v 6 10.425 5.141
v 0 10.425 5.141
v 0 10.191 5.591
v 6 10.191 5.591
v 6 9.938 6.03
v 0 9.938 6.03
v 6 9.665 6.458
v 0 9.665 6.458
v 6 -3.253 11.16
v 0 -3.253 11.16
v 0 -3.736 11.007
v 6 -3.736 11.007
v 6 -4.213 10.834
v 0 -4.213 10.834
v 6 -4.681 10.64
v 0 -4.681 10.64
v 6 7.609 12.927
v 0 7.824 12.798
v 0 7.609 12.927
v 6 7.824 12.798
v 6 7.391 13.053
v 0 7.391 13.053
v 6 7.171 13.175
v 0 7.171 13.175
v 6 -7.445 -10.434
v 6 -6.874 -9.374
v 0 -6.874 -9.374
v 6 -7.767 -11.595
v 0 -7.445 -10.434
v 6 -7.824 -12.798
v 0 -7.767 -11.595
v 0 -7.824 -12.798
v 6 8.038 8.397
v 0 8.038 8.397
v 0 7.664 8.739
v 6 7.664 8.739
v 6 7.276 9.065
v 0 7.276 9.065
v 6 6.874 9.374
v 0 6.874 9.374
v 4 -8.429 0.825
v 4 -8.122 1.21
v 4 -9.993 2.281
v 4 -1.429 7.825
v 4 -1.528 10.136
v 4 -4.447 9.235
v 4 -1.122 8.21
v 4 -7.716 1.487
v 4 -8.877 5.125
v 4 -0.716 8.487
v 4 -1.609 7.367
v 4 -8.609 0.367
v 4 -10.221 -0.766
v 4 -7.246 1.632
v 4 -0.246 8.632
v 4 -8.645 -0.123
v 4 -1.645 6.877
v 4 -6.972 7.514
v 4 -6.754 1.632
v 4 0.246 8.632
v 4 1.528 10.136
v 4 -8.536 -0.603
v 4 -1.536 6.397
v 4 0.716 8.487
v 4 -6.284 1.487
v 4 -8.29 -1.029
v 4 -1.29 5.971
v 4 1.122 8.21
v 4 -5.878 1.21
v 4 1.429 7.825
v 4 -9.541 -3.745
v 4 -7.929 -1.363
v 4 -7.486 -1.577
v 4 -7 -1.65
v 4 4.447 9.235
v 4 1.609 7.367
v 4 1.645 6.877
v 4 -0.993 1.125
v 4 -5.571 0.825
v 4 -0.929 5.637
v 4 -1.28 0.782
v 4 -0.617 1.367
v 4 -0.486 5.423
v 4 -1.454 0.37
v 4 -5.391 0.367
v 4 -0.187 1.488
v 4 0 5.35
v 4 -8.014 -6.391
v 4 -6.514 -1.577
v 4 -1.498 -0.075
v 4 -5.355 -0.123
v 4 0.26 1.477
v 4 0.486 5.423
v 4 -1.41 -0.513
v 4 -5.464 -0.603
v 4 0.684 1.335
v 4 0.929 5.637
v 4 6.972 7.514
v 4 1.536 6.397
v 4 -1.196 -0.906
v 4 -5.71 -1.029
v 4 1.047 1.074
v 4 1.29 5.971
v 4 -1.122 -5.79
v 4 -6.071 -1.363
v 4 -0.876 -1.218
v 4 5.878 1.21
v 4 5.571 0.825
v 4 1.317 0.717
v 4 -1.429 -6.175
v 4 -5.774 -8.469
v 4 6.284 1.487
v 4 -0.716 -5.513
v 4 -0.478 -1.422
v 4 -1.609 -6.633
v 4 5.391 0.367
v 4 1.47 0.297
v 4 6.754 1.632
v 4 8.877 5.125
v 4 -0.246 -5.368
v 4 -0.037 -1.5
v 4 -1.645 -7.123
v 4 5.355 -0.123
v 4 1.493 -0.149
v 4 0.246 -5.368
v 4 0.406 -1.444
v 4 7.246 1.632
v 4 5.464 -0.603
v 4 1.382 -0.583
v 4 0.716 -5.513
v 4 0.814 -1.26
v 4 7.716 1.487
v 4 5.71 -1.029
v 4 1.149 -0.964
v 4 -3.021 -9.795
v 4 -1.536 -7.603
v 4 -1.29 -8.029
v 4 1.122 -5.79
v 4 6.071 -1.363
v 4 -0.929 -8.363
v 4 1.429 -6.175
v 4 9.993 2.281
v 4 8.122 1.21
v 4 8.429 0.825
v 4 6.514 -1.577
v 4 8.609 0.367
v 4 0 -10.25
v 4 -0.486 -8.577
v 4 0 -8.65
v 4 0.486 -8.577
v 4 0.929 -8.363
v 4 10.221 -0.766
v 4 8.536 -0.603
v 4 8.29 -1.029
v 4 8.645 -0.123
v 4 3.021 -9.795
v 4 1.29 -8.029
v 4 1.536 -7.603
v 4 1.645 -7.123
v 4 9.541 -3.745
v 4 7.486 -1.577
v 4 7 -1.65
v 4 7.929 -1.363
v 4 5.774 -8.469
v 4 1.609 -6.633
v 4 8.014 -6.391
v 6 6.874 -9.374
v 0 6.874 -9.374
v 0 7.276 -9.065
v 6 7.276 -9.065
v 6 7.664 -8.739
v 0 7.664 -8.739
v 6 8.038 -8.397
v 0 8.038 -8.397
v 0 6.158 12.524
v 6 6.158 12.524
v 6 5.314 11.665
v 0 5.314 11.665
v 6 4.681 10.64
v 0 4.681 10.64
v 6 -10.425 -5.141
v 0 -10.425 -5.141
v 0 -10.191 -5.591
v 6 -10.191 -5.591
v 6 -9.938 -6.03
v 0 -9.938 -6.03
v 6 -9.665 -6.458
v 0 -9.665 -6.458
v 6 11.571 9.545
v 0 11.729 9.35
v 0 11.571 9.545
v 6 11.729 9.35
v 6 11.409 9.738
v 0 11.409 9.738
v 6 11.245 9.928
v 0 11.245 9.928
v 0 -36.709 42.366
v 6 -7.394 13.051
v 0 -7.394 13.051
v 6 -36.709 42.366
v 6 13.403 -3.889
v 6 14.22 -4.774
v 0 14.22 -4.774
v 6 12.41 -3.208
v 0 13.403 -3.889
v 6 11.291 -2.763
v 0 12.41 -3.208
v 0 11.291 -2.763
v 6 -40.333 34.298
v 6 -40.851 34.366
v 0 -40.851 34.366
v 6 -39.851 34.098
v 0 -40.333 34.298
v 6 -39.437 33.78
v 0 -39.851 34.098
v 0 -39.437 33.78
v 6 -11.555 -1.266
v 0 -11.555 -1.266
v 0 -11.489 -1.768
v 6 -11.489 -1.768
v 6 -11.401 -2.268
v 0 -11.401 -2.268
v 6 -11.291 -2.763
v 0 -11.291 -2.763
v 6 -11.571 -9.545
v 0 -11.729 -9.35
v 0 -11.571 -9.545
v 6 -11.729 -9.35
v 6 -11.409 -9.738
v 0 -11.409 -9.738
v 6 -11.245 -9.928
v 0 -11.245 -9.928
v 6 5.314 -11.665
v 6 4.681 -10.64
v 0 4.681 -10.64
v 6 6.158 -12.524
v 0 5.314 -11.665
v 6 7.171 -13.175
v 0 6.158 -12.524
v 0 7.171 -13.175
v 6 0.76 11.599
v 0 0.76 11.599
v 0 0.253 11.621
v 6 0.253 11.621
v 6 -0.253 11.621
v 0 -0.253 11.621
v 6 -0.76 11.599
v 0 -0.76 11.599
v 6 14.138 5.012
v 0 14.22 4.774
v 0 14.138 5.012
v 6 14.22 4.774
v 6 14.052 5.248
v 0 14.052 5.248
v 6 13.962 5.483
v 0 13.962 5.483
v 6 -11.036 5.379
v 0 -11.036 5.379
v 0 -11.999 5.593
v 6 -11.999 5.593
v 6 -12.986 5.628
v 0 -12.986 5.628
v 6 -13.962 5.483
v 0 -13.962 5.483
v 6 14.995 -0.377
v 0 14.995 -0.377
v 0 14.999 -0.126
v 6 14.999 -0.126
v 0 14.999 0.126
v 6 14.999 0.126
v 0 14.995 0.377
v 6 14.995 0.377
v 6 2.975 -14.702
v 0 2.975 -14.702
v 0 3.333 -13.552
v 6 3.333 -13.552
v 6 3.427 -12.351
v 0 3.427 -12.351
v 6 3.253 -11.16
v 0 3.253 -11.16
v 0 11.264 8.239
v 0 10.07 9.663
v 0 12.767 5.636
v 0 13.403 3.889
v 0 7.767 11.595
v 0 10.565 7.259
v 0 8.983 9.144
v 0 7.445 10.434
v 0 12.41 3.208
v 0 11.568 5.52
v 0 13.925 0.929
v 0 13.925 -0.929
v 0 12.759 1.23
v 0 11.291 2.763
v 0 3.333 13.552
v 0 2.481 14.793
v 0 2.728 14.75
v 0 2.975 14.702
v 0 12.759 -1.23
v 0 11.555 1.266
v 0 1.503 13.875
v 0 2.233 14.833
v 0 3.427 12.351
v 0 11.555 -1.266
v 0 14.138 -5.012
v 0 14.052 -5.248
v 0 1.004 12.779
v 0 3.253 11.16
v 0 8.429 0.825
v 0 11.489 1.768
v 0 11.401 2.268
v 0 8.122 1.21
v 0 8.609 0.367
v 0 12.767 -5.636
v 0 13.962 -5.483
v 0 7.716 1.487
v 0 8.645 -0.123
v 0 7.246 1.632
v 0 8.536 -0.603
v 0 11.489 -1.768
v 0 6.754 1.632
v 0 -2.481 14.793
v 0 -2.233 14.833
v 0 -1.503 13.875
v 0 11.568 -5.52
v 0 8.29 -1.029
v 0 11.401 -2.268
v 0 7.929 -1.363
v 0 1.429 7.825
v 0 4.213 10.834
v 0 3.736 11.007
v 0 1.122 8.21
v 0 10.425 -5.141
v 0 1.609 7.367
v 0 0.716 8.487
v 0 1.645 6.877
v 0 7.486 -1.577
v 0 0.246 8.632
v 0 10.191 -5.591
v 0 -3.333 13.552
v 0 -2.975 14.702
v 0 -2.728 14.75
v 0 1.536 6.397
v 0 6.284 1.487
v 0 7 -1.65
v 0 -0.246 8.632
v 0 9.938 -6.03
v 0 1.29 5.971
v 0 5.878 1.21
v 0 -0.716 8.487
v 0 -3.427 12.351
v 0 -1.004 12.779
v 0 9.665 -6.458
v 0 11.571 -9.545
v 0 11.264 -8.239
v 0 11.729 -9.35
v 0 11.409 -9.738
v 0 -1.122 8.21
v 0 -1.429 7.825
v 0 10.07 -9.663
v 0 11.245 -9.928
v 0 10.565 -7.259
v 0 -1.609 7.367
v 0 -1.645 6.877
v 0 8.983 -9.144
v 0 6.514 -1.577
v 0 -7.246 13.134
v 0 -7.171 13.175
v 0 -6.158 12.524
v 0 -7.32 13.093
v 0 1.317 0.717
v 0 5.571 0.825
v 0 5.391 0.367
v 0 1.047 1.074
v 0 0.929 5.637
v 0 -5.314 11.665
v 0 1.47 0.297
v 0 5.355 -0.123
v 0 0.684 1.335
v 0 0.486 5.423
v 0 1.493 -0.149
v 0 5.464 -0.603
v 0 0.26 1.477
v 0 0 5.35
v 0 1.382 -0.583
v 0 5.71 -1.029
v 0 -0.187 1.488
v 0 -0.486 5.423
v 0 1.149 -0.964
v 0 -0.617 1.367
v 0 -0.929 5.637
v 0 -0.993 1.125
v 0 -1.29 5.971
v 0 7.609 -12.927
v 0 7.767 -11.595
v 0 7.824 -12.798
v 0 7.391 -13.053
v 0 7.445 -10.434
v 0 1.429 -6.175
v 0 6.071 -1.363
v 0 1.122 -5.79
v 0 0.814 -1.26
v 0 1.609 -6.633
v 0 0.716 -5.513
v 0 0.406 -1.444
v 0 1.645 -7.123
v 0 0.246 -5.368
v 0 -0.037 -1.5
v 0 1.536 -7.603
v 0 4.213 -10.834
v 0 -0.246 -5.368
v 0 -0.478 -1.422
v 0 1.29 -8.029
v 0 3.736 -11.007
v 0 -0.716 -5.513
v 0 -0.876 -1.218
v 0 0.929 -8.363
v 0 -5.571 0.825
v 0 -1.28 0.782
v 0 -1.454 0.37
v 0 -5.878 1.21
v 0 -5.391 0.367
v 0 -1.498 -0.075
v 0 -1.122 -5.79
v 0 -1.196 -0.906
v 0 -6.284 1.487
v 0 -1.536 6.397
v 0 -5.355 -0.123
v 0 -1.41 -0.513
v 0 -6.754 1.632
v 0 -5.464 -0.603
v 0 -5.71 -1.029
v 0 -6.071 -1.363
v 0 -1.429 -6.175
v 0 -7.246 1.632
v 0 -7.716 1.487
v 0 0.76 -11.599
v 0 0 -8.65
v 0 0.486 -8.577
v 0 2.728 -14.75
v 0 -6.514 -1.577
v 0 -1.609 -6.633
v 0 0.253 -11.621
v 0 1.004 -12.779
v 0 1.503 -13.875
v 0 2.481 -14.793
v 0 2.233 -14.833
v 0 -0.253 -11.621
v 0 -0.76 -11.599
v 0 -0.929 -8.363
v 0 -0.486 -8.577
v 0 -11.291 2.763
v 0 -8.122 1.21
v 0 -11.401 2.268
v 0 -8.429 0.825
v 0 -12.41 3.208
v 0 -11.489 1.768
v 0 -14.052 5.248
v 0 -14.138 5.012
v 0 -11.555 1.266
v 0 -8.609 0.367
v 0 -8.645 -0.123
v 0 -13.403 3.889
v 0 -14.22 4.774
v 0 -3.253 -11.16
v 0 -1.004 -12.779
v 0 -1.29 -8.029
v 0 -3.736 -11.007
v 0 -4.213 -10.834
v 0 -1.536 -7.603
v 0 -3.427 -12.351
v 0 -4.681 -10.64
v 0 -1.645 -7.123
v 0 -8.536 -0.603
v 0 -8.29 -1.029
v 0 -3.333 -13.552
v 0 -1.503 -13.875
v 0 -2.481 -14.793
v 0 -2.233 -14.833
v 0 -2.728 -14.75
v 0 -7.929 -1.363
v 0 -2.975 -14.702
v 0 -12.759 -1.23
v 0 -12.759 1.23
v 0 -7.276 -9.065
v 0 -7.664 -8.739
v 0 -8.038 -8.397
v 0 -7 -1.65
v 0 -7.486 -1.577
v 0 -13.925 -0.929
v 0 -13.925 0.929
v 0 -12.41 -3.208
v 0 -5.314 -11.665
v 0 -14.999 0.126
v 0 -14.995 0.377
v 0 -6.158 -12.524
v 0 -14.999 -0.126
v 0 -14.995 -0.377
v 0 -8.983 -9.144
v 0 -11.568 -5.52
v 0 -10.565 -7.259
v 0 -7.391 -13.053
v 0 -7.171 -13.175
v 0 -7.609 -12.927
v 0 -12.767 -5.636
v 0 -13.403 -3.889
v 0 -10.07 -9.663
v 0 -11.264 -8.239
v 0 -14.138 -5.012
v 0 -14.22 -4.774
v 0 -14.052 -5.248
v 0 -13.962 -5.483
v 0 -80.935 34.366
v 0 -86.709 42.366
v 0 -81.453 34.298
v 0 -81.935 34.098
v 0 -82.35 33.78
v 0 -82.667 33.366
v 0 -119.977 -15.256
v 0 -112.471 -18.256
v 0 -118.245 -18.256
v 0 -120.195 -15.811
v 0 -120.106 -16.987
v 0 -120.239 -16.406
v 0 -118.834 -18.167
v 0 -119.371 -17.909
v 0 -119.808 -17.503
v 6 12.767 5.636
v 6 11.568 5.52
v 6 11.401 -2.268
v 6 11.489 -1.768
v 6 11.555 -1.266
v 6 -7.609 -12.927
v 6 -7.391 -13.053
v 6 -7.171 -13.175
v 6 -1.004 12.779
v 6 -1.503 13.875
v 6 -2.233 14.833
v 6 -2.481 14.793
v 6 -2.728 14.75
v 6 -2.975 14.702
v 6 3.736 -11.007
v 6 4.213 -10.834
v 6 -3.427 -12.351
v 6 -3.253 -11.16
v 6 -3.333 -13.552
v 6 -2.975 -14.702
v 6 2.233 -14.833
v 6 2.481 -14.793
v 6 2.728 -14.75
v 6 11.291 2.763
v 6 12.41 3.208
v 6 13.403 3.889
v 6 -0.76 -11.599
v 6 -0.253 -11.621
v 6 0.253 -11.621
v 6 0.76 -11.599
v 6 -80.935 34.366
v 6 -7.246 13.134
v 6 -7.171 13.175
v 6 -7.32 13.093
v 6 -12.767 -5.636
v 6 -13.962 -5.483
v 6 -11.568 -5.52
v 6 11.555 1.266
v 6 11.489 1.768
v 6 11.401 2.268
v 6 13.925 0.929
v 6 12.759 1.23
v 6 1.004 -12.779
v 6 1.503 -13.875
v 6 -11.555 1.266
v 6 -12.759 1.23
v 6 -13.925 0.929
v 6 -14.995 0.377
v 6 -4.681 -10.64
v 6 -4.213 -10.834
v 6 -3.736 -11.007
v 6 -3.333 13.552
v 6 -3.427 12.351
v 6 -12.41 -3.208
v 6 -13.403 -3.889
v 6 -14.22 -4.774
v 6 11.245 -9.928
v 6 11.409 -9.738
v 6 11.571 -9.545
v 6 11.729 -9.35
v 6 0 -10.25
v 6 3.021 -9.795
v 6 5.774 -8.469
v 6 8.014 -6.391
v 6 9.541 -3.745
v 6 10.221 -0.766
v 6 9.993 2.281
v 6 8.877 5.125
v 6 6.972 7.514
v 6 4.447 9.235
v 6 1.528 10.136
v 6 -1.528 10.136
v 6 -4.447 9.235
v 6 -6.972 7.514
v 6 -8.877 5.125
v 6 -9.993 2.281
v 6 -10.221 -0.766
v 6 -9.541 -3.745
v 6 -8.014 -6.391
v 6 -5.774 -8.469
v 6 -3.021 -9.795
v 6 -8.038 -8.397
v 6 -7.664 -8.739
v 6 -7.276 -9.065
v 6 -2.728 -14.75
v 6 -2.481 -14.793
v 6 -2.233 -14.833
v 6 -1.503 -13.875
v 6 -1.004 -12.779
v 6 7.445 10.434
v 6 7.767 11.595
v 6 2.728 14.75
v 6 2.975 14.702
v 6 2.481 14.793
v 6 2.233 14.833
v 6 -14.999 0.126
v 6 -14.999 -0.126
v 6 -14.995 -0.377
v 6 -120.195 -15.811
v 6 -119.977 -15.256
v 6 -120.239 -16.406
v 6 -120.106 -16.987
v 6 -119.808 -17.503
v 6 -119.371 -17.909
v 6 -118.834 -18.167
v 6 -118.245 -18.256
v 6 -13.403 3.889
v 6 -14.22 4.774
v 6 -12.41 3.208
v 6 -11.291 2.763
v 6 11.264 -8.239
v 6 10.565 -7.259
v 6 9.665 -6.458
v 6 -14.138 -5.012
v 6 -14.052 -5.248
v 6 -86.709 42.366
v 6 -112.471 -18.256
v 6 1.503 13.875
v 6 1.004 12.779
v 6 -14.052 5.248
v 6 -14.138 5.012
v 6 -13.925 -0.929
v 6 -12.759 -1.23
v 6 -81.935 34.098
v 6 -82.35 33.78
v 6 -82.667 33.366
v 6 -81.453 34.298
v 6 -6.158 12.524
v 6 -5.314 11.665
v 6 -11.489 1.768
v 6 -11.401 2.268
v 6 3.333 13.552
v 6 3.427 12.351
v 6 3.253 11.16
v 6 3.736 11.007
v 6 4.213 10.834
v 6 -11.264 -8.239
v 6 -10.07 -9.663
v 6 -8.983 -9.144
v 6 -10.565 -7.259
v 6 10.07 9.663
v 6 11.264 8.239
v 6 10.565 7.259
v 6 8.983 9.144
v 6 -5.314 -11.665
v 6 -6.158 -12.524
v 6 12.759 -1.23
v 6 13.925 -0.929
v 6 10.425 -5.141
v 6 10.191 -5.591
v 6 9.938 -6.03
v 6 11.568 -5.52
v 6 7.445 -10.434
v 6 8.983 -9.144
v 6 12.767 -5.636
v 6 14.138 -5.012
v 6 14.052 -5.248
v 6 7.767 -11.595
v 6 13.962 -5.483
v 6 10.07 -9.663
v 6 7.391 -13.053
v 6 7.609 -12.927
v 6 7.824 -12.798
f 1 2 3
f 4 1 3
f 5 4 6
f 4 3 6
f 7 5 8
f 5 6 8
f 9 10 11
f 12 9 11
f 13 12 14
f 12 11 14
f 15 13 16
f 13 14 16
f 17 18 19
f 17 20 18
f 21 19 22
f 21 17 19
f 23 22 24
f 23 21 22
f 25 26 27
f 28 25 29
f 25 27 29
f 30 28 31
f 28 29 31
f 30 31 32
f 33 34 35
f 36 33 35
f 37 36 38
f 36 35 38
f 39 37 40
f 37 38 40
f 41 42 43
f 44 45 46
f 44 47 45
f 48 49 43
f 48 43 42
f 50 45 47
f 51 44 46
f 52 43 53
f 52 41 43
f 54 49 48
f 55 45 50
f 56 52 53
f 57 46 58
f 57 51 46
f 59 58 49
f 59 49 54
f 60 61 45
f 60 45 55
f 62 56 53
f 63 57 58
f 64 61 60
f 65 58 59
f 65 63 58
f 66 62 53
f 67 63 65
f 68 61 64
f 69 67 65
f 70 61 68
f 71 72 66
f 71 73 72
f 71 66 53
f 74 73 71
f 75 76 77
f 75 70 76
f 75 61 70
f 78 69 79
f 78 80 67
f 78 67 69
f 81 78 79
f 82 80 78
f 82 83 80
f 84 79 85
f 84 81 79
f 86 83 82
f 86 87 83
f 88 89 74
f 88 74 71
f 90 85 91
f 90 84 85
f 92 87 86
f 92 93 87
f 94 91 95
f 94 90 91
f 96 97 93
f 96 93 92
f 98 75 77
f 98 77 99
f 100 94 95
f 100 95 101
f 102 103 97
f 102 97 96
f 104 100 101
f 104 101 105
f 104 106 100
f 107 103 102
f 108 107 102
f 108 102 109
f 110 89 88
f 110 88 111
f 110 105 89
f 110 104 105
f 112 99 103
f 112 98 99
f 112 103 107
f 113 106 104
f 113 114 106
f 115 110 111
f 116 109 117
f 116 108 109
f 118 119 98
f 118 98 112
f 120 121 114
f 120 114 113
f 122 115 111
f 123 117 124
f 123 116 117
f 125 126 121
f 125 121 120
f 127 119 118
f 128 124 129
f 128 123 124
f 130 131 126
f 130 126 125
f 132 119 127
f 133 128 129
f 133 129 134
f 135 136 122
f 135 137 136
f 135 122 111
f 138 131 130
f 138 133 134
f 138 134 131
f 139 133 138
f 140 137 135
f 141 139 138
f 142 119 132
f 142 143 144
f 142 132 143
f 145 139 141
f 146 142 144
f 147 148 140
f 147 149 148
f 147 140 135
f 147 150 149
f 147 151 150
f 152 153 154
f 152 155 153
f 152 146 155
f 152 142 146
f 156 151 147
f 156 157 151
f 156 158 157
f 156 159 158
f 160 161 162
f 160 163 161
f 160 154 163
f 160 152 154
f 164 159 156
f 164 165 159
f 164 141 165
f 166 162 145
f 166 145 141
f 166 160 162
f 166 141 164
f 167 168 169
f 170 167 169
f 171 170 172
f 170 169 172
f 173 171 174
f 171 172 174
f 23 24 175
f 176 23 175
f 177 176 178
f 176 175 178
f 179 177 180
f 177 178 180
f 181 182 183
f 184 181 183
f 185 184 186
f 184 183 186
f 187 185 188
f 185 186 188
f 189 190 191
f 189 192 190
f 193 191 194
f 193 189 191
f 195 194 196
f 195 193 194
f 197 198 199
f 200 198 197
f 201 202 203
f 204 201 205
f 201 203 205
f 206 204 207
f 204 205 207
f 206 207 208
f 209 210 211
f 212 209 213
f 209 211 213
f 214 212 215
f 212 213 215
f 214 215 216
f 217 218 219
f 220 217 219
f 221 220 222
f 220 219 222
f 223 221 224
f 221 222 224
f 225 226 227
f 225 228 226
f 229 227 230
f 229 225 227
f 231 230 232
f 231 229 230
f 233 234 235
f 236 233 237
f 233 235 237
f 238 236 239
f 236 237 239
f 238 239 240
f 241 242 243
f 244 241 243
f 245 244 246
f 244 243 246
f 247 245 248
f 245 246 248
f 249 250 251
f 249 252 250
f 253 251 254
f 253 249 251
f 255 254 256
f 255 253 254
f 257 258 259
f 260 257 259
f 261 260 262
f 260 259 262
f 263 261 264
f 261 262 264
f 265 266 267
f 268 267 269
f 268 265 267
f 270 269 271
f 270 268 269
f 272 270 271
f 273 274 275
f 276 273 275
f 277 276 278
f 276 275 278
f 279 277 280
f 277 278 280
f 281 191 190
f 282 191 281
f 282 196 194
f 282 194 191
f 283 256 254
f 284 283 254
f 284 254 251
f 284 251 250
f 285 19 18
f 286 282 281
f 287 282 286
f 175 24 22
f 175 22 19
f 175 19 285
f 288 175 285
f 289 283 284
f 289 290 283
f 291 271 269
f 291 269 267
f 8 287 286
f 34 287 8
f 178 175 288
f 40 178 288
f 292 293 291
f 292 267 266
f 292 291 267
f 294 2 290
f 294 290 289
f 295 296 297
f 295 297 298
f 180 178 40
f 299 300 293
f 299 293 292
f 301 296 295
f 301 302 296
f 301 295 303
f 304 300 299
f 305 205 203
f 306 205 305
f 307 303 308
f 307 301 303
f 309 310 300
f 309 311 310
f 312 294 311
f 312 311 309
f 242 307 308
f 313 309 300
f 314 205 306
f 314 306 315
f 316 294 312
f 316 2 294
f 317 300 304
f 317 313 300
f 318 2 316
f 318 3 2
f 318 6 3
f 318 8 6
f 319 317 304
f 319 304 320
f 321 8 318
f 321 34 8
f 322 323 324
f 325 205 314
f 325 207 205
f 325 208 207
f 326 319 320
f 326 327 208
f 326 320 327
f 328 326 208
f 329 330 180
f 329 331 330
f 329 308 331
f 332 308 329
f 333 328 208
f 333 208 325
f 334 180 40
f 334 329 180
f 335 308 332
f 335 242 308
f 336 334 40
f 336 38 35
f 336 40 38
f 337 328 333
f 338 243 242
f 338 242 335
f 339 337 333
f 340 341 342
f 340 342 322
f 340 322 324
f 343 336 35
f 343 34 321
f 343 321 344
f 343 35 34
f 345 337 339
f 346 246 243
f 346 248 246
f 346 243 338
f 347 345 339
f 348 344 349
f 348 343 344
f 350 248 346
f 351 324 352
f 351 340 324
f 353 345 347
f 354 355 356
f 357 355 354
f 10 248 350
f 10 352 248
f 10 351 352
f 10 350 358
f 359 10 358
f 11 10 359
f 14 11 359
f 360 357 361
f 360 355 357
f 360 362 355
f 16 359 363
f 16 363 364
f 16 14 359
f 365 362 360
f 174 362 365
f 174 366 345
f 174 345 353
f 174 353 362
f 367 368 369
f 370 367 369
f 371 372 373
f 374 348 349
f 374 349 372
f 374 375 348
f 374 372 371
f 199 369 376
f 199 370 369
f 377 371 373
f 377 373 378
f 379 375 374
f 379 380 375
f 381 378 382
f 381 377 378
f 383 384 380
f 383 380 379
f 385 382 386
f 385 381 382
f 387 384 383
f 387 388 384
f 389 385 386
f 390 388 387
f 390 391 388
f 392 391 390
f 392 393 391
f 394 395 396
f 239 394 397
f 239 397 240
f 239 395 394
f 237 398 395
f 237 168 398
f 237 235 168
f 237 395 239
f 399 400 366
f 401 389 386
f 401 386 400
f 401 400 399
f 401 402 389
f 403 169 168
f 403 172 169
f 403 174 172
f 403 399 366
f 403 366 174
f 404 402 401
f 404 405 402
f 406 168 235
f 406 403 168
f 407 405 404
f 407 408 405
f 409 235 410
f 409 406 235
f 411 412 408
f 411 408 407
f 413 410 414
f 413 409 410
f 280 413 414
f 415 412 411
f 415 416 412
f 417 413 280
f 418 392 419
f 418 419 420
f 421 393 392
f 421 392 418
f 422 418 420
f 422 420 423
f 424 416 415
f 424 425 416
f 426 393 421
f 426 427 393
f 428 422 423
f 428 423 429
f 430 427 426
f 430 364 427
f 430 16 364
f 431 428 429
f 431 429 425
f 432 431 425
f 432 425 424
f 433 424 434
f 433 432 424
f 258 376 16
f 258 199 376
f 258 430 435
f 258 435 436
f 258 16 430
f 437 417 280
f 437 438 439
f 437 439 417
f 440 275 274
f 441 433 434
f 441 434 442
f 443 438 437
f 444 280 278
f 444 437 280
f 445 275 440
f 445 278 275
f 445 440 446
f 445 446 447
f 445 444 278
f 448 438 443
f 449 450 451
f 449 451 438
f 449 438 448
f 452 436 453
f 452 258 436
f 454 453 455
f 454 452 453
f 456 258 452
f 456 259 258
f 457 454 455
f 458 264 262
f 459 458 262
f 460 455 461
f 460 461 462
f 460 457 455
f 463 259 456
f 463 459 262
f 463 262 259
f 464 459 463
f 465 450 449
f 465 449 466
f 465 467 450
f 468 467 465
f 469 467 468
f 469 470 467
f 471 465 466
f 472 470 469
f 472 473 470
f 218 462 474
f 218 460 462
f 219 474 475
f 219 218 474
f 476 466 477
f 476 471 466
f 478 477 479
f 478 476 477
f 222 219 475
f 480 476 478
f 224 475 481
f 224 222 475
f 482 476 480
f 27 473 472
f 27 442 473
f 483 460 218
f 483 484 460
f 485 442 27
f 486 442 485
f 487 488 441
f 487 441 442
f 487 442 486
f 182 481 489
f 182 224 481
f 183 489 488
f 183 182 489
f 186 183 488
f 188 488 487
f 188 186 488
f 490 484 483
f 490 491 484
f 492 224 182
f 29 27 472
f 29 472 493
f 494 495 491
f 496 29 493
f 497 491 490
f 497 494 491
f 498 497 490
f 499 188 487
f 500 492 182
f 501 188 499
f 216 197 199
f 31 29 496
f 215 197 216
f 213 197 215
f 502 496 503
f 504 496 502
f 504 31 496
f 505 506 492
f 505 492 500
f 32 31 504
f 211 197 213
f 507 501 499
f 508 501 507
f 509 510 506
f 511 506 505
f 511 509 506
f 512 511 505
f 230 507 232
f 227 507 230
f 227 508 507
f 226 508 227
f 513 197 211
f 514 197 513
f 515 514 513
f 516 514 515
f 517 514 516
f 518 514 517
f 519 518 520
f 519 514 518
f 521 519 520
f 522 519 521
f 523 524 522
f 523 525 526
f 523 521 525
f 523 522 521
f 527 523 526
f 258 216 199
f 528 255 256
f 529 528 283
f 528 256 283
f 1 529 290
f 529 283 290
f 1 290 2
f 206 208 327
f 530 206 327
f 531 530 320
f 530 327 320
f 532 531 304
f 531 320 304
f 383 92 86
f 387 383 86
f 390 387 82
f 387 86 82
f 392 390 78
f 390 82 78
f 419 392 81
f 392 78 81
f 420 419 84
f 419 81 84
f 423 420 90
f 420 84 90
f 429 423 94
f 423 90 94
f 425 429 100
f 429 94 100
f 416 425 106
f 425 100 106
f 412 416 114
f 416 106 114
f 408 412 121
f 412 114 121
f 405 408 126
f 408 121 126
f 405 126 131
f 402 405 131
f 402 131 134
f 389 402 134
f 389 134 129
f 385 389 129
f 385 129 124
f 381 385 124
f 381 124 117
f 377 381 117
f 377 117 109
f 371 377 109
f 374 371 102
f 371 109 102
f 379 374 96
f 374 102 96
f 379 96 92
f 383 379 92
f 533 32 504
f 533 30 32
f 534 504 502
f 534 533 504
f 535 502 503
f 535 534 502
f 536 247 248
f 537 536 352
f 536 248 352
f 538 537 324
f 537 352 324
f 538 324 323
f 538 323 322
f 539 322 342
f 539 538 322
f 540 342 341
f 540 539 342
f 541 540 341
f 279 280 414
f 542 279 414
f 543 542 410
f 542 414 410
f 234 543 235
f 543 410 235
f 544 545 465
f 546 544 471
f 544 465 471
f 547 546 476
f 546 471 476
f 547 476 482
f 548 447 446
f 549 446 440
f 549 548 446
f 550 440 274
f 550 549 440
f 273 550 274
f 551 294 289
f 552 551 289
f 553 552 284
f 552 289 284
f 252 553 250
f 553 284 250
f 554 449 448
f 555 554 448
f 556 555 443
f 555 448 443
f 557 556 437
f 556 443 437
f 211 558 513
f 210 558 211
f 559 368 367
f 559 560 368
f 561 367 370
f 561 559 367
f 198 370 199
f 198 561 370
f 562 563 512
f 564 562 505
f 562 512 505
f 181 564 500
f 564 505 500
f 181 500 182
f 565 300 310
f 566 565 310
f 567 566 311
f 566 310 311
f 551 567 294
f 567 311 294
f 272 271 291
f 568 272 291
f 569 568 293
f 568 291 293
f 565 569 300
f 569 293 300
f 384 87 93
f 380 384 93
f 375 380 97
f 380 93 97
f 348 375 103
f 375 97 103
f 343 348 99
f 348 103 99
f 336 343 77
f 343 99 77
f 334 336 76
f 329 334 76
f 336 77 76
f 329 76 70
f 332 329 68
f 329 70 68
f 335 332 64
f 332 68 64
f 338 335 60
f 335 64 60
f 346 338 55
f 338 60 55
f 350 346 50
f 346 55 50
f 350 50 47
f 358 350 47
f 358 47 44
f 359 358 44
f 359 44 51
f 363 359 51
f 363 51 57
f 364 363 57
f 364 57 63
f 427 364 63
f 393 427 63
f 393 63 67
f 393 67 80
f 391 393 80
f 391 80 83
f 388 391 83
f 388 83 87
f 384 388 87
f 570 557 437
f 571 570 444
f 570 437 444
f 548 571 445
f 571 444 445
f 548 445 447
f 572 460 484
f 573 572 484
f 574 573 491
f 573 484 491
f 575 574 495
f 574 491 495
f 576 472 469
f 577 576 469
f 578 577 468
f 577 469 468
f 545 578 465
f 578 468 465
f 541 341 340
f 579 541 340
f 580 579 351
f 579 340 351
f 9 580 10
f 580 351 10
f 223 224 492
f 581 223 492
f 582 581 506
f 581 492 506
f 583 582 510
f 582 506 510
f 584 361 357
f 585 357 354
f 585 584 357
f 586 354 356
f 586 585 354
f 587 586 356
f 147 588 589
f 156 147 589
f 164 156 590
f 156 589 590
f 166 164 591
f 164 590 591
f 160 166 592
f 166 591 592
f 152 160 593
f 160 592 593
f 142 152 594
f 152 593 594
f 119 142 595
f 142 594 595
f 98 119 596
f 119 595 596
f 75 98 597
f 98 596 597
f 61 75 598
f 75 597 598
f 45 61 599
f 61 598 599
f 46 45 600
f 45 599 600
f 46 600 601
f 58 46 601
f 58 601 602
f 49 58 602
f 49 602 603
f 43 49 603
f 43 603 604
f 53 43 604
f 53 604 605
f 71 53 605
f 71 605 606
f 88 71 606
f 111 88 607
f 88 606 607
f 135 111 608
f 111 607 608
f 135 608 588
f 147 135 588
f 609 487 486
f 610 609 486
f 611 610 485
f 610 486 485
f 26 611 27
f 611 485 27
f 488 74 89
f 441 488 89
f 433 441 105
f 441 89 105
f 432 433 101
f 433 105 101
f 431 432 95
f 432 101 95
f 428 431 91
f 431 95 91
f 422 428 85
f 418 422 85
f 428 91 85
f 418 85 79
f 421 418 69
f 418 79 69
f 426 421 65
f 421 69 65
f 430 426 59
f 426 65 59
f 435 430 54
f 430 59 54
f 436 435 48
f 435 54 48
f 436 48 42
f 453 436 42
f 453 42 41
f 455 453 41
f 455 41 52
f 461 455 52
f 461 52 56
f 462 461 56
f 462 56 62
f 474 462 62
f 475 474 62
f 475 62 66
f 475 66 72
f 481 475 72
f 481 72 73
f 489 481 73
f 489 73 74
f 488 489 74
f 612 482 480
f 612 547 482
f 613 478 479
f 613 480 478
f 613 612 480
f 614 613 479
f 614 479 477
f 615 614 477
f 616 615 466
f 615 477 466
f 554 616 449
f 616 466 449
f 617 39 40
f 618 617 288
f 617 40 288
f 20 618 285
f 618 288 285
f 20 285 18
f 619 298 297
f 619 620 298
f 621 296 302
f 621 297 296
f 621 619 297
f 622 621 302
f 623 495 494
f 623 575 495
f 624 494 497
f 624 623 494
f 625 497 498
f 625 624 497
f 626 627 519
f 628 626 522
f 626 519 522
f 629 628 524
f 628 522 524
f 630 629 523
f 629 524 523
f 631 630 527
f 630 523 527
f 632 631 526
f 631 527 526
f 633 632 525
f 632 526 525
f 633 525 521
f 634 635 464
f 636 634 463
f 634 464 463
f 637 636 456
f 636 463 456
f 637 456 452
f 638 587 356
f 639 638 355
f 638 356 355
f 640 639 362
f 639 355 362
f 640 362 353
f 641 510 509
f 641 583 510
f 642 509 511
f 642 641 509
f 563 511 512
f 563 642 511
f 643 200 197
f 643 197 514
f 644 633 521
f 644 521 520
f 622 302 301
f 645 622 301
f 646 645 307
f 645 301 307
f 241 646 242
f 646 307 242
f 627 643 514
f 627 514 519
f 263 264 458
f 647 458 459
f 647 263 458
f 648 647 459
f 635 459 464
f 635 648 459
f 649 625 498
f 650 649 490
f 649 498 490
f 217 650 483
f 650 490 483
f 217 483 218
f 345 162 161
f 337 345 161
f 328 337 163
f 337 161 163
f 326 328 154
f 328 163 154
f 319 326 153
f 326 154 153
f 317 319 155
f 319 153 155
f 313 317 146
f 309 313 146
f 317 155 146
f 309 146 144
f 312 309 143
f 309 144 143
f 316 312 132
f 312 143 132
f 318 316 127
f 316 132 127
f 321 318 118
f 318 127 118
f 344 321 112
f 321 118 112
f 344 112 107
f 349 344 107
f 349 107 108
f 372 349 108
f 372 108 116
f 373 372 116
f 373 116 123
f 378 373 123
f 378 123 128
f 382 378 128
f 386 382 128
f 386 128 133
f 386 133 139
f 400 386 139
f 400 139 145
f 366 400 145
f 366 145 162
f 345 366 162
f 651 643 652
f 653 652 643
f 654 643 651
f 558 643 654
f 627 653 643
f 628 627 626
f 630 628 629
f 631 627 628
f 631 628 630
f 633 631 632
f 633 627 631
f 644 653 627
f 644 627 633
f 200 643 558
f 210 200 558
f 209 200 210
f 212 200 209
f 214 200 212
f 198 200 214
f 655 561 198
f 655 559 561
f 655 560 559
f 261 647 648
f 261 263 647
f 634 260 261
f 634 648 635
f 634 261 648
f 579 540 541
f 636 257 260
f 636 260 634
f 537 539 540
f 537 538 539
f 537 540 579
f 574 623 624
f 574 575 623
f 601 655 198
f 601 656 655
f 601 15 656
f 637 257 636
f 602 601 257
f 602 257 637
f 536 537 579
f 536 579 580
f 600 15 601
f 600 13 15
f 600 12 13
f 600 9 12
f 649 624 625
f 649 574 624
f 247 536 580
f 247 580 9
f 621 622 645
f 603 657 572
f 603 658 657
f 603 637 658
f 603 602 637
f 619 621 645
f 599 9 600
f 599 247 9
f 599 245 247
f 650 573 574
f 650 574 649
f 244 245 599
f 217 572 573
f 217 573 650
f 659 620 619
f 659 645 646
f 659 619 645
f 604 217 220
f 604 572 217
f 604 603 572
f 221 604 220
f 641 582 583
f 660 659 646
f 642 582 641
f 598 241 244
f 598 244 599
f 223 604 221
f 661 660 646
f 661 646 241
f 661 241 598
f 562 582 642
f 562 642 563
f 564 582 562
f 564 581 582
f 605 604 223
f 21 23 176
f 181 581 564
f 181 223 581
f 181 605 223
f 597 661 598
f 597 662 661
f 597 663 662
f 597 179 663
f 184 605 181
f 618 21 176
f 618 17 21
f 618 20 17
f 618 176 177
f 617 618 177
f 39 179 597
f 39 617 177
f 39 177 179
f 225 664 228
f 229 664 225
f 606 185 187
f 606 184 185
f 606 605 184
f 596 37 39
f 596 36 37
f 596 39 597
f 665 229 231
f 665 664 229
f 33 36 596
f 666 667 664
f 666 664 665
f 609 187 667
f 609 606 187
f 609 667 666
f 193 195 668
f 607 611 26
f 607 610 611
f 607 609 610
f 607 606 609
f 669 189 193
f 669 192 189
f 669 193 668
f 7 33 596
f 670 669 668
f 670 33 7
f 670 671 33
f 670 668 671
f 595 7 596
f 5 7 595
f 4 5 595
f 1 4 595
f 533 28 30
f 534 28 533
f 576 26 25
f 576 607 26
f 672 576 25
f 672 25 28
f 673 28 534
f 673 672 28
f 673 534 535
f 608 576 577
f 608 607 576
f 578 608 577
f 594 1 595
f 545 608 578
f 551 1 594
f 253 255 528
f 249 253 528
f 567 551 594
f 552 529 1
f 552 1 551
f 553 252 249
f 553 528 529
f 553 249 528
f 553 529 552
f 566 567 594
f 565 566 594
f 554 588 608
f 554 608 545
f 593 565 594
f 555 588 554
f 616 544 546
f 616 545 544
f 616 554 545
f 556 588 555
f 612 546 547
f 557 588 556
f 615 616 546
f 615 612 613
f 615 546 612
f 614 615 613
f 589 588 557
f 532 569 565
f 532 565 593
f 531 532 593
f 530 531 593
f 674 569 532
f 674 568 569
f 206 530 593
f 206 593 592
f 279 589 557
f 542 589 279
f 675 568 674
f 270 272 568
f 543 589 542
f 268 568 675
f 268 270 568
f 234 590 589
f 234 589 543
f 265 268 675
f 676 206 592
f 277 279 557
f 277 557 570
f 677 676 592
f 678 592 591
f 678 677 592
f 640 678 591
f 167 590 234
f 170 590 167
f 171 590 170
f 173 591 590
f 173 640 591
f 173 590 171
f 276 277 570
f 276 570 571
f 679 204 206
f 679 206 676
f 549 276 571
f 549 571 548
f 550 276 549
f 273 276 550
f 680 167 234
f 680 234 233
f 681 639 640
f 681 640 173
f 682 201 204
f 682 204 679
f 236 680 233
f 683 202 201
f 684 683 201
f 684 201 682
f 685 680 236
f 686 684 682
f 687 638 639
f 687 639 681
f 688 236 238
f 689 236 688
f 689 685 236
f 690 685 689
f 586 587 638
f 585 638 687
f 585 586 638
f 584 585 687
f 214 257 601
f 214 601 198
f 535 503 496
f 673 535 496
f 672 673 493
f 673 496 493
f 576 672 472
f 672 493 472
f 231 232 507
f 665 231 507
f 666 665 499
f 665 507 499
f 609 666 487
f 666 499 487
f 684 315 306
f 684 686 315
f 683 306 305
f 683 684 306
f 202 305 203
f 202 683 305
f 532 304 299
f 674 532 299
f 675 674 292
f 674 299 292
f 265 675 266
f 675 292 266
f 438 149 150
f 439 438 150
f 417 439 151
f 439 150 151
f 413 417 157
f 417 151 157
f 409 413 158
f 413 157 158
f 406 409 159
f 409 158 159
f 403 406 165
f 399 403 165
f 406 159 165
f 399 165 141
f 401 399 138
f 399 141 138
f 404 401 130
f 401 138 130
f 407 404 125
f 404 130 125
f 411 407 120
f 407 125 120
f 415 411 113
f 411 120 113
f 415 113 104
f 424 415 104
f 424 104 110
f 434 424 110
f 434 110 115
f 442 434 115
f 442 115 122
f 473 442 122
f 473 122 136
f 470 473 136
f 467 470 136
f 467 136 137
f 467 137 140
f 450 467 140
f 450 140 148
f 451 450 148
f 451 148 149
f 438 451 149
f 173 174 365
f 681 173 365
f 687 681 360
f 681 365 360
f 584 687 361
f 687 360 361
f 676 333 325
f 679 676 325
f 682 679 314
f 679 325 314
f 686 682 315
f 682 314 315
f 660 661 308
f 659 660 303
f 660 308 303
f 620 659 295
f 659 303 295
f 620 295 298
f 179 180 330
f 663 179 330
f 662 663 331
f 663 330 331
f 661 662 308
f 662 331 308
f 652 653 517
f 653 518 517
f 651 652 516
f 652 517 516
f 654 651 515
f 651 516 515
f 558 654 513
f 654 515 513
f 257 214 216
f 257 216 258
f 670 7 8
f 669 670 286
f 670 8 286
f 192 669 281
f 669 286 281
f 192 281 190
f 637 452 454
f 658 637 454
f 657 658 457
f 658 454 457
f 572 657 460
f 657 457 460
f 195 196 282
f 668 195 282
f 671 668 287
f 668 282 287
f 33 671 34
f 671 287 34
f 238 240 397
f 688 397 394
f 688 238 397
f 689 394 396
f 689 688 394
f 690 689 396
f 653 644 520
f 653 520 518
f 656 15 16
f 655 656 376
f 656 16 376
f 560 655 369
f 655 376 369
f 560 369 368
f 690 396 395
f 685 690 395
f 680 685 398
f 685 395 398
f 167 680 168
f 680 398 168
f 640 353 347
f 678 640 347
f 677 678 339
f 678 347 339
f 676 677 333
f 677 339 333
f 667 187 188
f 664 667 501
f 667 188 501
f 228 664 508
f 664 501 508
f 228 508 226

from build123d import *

# Parameters (mm, degrees)
BASPROSKE_W         = 6
BASPROSKE_H         = 15
TOOTHCUT_DEPTH      = 23.045407685
TEETHCUTS_COUNT     = 18
TEETHCUTS_ANGLE     = 340
BORSKE_R            = 1.5
BORE_DEPTH          = 50.0000508
MOVE_BODY_10_ANGLE  = 10
EXTRUDE_2_DEPTH     = 6
SKETCH_2_R          = 1.65
CUT_EXTRUDE_1_DEPTH = 6
SKETCH_3_R          = 10.25
CUT_EXTRUDE_2_DEPTH = 2
FILLET_1_R          = 2


with BuildPart() as part:
    # BasProSke → Base-Revolve (revolve)
    with BuildSketch(Plane(origin=(0, 0, 0), x_dir=(1, 0, 0), z_dir=(0, 1, 0))):
        with Locations((3, 7.5)):
            Rectangle(BASPROSKE_W, BASPROSKE_H)
    revolve(axis=Axis((-10, 0, 0), (1, 0, 0)))

    # TooCutSke → ToothCut (cut, through all)
    with BuildSketch(Plane(origin=(0, 0, 0), x_dir=(0, 0, -1), z_dir=(1, 0, 0))):
        with BuildLine():
            ThreePointArc((0.759974923, 11.599129886), (0, 11.624), (-0.759974923, 11.599129886))
            ThreePointArc((-0.759974923, 11.599129886), (-1.229186471, 13.354767823), (-2.254227748, 14.855339189))
            ThreePointArc((-2.254227748, 14.855339189), (0, 15.0254), (2.254227748, 14.855339189))
            ThreePointArc((2.254227748, 14.855339189), (1.229186471, 13.354767823), (0.759974923, 11.599129886))
        make_face()
    toothcut = extrude(amount=TOOTHCUT_DEPTH, mode=Mode.SUBTRACT)

    # TeethCuts: ToothCut ×18 about axis
    teethcuts_axis = Axis((-10, 0, 0), (1, 0, 0))
    for i in range(1, TEETHCUTS_COUNT):
        add(toothcut.rotate(teethcuts_axis, i * TEETHCUTS_ANGLE / (TEETHCUTS_COUNT - 1)), mode=Mode.SUBTRACT)

    # BorSke → Bore (cut, symmetric)
    with BuildSketch(Plane(origin=(0, 0, 0), x_dir=(0, 0, -1), z_dir=(1, 0, 0))):
        Circle(BORSKE_R)
    extrude(amount=BORE_DEPTH, both=True, mode=Mode.SUBTRACT)


with BuildPart() as part_1:
    # Move Body 10: moved
    add(part.part.rotate(Axis((0, 0, 0), (-1, 0, 0)), MOVE_BODY_10_ANGLE))

    # 草图1 → 凸台-拉伸2 (add)
    with BuildSketch(Plane(origin=(6, 0, 0), x_dir=(0, 0, -1), z_dir=(1, 0, 0))):
        Polygon((-10.545854675, -4.889000426), (-42.365659829, -36.708805579), (-42.365659829, -86.708805579), (18.256118436, -121.708805579), (18.256118436, -112.471201272), (-34.365659829, -82.090003426), (-34.365659829, -40.022514078), (-4.889000426, -10.545854675), align=None)
    extrude(amount=-EXTRUDE_2_DEPTH)

    # 草图2 → 切除-拉伸1 (cut)
    with BuildSketch(Plane(origin=(6, 0, 0), x_dir=(0, 0, -1), z_dir=(1, 0, 0))):
        with Locations((-7, 0)):
            Circle(SKETCH_2_R)
        with Locations((0, 7)):
            Circle(SKETCH_2_R)
        with Locations((7, 0)):
            Circle(SKETCH_2_R)
        with Locations((0, -7)):
            Circle(SKETCH_2_R)
    extrude(amount=-CUT_EXTRUDE_1_DEPTH, mode=Mode.SUBTRACT)

    # 草图3 → 切除-拉伸2 (cut)
    with BuildSketch(Plane(origin=(6, 0, 0), x_dir=(0, 0, -1), z_dir=(1, 0, 0))):
        Circle(SKETCH_3_R)
    extrude(amount=-CUT_EXTRUDE_2_DEPTH, mode=Mode.SUBTRACT)

    # 圆角1
    fillet_1_edges = [part_1.edges().sort_by_distance(p)[0] for p in [
        (3, -82.090003426, 34.365659829),
        (3, -40.022514078, 34.365659829),
        (3, -121.708805579, -18.256118436),
    ]]
    fillet(fillet_1_edges, radius=FILLET_1_R)


solid = part_1.part
